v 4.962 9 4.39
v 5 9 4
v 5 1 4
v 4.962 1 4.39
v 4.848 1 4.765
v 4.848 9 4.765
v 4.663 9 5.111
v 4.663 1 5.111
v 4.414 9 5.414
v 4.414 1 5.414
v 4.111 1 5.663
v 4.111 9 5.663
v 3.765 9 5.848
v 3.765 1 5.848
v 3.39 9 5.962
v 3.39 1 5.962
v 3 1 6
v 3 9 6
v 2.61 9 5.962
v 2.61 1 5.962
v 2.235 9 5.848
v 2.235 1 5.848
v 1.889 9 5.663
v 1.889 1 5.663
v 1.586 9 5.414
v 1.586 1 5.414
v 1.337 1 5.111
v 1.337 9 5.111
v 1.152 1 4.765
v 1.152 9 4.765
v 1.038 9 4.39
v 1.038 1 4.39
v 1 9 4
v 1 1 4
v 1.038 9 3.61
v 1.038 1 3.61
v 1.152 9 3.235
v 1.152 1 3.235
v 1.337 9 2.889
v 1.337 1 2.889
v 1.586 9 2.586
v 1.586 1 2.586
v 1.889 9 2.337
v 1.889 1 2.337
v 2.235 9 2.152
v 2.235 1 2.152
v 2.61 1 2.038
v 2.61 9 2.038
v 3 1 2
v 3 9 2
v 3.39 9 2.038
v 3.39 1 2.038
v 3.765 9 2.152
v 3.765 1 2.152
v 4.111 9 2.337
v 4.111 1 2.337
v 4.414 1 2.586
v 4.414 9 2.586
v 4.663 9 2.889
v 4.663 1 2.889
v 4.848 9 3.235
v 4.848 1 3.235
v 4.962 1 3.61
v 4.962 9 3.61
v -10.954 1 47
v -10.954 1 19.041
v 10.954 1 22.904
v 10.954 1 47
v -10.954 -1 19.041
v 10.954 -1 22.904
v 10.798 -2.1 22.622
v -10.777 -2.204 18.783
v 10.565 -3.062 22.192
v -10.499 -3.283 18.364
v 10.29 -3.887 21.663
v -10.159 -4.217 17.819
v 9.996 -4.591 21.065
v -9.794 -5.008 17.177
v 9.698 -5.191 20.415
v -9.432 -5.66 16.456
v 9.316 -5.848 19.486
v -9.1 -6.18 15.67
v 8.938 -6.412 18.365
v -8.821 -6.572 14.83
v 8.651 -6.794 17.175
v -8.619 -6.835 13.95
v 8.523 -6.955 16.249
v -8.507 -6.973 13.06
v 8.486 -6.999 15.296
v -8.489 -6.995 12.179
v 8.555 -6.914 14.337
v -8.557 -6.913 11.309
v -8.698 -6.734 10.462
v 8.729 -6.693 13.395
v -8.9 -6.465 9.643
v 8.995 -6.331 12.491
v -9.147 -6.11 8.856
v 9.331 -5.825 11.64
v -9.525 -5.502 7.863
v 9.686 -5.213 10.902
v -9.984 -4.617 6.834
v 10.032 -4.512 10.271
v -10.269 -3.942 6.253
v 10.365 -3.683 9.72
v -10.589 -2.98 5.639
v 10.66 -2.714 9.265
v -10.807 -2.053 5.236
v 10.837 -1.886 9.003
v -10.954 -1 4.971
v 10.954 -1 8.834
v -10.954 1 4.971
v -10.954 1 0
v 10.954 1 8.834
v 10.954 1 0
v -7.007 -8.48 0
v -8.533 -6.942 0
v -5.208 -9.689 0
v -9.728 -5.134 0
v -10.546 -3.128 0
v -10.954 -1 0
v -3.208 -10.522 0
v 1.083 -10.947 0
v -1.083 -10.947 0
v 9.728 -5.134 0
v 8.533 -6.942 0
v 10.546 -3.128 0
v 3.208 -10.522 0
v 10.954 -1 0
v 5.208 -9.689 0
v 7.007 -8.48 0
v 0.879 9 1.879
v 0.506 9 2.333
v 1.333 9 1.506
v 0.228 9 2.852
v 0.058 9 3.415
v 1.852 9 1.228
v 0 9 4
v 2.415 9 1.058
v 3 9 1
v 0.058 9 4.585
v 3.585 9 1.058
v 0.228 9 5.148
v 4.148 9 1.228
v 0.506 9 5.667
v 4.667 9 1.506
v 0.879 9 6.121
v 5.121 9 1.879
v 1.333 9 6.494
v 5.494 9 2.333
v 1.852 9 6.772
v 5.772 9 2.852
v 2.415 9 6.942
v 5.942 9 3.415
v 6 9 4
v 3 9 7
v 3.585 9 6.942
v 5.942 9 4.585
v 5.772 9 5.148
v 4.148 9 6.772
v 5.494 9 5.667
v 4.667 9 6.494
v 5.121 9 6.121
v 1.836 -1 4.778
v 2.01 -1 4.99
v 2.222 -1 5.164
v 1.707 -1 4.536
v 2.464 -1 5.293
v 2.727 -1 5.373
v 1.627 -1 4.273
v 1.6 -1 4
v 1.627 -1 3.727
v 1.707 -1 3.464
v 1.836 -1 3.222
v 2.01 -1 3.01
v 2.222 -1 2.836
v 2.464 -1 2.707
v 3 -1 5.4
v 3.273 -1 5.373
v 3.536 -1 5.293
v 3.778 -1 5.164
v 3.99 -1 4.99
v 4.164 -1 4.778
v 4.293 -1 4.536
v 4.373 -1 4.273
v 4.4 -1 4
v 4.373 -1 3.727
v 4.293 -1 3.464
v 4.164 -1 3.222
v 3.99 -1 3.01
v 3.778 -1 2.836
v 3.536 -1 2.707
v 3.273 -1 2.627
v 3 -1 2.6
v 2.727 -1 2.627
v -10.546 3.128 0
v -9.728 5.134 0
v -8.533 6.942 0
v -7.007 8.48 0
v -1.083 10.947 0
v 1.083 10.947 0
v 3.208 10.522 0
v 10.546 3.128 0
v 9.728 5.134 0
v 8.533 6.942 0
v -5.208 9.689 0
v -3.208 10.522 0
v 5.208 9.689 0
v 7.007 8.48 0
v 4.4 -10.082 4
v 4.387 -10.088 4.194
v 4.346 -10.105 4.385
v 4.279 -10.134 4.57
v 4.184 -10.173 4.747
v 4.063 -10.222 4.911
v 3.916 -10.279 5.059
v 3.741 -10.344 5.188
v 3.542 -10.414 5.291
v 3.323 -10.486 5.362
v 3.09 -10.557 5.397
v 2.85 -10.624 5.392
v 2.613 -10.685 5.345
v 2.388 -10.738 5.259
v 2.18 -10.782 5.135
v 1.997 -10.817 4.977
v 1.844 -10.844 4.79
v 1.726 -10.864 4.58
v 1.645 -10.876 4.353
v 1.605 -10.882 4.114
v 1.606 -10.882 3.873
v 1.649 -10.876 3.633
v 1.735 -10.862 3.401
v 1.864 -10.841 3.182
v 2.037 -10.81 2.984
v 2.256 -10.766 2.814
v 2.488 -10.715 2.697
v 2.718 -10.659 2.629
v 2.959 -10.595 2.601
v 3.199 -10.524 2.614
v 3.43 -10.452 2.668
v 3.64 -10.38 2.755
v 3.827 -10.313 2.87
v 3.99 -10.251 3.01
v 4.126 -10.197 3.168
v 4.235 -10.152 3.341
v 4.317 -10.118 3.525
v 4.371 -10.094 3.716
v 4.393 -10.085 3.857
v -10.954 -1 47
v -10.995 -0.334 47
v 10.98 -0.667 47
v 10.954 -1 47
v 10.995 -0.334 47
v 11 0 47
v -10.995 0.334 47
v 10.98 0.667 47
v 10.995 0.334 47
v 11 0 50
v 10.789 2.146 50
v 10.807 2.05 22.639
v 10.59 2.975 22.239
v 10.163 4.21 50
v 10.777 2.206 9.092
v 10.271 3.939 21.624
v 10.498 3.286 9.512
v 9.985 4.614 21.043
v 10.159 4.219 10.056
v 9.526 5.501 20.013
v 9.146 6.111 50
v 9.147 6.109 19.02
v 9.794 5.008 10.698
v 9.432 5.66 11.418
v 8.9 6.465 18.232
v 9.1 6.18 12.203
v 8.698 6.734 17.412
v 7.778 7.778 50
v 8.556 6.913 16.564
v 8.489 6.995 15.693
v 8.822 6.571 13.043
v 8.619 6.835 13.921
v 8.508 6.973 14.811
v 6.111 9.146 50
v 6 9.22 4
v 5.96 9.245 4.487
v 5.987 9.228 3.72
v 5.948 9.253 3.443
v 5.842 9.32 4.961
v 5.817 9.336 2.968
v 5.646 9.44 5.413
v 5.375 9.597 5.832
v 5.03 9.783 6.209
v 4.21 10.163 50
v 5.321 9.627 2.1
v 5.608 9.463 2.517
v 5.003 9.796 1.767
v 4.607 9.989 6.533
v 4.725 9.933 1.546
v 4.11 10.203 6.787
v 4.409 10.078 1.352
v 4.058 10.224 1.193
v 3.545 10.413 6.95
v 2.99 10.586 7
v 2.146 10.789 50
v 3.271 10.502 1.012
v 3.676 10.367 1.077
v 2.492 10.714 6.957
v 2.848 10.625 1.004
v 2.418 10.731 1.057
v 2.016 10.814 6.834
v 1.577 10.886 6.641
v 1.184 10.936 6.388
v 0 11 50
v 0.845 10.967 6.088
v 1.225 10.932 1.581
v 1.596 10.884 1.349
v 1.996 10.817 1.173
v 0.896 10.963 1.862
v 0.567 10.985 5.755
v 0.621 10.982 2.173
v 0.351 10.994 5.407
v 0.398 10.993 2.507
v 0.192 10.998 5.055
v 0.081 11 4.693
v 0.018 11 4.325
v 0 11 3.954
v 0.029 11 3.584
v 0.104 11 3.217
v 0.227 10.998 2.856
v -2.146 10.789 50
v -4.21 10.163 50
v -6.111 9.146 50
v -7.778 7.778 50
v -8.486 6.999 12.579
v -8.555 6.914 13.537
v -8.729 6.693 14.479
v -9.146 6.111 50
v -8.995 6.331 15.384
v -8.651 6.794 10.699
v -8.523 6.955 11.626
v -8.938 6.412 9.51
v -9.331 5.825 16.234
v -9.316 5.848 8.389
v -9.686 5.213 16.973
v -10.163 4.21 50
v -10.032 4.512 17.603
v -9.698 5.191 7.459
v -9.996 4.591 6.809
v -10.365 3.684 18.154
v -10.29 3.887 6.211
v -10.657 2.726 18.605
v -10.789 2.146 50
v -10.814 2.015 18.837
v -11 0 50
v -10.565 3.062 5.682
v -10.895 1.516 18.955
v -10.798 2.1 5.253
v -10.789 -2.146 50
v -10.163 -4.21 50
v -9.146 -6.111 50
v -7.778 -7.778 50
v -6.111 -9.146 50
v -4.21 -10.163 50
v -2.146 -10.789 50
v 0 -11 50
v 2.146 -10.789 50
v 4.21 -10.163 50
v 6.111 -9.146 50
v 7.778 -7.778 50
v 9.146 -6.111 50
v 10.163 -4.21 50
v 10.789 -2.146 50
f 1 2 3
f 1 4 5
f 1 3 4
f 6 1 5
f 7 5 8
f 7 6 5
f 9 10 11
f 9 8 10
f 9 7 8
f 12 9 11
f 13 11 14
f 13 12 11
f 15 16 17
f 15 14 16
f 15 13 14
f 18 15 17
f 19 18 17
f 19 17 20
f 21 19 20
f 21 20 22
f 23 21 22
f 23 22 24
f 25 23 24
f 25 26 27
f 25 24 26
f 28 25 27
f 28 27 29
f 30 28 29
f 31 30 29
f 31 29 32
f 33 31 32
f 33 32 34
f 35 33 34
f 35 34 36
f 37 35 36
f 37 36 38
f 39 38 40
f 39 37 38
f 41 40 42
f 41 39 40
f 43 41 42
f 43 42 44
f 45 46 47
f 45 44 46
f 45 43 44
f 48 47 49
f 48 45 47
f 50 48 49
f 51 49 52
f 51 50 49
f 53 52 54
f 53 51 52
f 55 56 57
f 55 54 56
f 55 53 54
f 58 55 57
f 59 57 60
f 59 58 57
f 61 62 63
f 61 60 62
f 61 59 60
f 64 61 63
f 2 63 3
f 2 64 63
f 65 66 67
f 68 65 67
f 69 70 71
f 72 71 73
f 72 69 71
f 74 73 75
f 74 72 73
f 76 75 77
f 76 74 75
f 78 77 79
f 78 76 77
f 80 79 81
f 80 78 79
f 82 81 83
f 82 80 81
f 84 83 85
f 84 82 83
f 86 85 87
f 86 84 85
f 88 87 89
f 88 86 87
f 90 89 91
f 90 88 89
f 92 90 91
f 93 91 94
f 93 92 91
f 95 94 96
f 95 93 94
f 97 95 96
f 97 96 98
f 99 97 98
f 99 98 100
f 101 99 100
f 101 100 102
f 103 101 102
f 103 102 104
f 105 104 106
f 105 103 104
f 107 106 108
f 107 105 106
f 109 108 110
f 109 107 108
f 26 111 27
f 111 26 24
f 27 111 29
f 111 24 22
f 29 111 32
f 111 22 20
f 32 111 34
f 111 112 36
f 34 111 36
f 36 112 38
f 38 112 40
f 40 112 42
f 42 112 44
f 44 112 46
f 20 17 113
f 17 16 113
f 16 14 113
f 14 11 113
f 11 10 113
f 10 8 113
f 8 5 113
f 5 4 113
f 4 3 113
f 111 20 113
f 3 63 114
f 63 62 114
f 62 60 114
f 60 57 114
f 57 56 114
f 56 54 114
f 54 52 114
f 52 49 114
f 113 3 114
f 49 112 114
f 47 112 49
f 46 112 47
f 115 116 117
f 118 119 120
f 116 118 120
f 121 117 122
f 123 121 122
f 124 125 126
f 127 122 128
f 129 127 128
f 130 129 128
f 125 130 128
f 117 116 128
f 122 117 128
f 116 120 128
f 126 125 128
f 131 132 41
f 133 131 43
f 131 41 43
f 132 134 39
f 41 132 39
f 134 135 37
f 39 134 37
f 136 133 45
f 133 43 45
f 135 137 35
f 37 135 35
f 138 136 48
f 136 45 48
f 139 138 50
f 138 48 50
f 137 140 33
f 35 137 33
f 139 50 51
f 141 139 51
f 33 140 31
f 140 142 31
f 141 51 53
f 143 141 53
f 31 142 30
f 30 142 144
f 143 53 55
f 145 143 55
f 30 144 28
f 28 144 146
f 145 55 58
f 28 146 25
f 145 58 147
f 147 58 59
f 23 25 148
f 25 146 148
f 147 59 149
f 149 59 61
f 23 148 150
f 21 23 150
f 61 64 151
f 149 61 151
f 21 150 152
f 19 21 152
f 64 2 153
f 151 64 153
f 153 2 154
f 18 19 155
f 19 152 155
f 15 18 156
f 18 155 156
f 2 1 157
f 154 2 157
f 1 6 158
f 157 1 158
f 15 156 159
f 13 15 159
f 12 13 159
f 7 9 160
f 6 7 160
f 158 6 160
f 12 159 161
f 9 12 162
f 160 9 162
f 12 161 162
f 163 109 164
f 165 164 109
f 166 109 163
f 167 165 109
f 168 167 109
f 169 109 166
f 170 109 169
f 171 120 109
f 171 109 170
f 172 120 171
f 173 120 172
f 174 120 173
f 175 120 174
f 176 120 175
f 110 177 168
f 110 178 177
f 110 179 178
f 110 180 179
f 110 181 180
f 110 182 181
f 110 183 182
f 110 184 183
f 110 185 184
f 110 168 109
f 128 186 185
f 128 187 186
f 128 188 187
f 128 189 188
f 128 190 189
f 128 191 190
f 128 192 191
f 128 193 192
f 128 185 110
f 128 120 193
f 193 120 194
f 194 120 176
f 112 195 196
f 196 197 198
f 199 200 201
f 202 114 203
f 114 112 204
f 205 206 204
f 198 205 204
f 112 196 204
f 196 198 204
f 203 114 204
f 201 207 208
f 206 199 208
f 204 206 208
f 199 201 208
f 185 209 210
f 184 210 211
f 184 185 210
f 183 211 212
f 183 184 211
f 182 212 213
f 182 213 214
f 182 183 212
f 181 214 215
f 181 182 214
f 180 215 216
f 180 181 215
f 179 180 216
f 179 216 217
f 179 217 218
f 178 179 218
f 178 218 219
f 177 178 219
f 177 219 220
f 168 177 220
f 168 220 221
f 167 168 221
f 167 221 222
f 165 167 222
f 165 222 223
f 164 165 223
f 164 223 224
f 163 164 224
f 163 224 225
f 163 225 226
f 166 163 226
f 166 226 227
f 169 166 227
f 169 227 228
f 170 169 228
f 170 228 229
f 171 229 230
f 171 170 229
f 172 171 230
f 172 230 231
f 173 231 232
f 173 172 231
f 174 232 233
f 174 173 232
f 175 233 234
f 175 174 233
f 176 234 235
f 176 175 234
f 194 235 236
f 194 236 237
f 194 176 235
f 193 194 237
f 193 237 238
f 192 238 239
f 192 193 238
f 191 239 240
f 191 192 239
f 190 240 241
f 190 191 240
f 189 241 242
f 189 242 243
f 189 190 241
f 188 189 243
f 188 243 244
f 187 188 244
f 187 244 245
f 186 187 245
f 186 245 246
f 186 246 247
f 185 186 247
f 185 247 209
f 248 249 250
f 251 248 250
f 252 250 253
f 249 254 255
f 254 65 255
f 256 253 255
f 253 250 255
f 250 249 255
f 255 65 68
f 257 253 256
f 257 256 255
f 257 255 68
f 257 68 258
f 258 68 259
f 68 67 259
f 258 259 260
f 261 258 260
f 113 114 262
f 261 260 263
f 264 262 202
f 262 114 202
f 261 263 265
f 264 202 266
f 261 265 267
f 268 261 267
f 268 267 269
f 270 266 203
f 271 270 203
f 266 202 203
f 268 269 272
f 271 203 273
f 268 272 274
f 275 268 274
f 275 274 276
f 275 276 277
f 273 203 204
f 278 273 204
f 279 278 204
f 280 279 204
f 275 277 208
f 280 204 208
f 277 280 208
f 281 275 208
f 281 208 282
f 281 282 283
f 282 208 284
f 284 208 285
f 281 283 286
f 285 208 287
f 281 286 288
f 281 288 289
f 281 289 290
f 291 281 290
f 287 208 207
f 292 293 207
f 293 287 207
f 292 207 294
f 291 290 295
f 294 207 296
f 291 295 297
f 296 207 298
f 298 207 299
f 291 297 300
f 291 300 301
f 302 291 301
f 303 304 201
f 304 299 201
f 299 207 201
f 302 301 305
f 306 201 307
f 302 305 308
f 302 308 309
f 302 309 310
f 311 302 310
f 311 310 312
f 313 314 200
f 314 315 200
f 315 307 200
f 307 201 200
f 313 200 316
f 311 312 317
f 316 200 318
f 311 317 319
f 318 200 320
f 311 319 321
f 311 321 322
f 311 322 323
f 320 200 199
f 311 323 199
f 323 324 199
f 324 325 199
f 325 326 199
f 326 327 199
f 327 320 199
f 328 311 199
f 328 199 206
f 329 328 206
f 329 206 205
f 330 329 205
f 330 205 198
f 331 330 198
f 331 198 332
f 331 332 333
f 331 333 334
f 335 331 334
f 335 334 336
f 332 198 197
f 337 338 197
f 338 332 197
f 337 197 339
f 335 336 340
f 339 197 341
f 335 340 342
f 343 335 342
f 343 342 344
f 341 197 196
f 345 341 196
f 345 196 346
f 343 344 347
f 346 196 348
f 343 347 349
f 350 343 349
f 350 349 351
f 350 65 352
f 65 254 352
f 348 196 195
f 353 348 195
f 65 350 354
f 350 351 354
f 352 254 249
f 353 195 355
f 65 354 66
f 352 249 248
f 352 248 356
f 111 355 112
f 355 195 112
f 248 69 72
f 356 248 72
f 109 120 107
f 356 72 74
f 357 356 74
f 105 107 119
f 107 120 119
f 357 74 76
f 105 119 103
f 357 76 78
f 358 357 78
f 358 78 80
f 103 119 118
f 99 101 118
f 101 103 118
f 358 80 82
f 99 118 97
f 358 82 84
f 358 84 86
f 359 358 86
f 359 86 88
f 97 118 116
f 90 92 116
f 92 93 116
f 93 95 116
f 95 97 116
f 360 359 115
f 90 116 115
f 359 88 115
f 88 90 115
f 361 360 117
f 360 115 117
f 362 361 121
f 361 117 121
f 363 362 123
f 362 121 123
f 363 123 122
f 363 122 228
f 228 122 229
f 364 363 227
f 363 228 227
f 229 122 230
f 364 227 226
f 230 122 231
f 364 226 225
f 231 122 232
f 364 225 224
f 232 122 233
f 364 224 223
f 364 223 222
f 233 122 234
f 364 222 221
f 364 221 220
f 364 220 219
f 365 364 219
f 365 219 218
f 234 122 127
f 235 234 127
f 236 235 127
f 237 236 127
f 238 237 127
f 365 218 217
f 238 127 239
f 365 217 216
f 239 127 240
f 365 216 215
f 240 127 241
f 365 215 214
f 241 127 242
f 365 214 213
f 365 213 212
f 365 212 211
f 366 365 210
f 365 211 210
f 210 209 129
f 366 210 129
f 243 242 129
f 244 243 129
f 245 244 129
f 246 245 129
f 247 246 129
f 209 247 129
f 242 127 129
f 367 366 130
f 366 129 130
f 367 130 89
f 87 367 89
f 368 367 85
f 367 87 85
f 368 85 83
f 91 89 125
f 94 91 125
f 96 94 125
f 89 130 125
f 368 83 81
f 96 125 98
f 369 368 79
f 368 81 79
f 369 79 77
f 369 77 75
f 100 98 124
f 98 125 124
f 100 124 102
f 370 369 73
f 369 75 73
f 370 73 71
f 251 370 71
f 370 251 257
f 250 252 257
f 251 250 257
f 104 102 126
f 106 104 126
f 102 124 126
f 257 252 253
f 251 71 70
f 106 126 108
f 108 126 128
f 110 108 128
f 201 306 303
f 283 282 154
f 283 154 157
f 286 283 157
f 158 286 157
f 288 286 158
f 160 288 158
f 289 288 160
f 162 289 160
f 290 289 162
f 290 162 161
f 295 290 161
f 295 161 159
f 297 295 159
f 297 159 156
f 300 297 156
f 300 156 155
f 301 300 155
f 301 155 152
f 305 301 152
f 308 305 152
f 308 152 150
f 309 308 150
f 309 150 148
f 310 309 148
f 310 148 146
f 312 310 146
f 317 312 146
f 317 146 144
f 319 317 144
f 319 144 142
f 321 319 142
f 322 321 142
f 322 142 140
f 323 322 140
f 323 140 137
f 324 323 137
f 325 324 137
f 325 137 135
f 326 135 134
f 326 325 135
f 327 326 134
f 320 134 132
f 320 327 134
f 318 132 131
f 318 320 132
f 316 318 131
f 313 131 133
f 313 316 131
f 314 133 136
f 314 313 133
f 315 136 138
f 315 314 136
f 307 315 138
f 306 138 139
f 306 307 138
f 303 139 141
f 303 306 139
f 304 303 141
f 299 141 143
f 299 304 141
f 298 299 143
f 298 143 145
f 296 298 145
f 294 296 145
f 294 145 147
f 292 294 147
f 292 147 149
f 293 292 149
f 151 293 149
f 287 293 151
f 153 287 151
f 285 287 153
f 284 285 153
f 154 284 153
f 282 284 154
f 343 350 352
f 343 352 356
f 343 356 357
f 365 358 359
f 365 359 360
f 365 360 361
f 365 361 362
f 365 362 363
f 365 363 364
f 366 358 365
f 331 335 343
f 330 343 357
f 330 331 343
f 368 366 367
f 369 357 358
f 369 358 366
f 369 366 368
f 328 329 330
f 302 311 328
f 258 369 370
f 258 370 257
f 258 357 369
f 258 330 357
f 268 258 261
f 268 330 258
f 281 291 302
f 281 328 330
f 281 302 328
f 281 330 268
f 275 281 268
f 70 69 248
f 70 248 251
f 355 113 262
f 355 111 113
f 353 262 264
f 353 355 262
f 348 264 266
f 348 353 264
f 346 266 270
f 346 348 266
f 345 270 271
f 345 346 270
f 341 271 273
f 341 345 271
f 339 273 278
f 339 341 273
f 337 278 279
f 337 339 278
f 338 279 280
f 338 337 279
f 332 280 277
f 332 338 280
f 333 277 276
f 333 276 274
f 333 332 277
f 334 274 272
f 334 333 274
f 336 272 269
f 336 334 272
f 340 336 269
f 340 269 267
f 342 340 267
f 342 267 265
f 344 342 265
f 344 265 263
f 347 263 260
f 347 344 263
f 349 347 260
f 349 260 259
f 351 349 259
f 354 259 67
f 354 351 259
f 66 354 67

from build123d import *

# Parameters (mm, degrees)
CYLINDER004_R               = 3
CYLINDER004_DEPTH           = 28
CYLINDER003_R               = 2
CYLINDER003_DEPTH           = 28
CYLINDER002_R               = 1.4
CYLINDER002_DEPTH           = 28
BOX_W                       = 100
BOX_H                       = 2
BOX_DEPTH                   = 100
CYLINDER001_R               = 7
CYLINDER001_DEPTH           = 100
CYLINDER001_PLACEMENT_ANGLE = 80
CYLINDER_R                  = 11
CYLINDER_DEPTH              = 50


with BuildPart() as cylinder004:
    # Cylinder004 → Cylinder004 (new body)
    with BuildSketch(Plane(origin=(3, 37, 4), x_dir=(1, 0, 0), z_dir=(0, -1, 0))):
        Circle(CYLINDER004_R)
    extrude(amount=CYLINDER004_DEPTH)


with BuildPart() as cylinder003:
    # Cylinder003 → Cylinder003 (new body)
    with BuildSketch(Plane(origin=(3, 28, 4), x_dir=(1, 0, 0), z_dir=(0, -1, 0))):
        Circle(CYLINDER003_R)
    extrude(amount=CYLINDER003_DEPTH)


with BuildPart() as cylinder002:
    # Cylinder002 → Cylinder002 (new body)
    with BuildSketch(Plane(origin=(3, 13, 4), x_dir=(1, 0, 0), z_dir=(0, -1, 0))):
        Circle(CYLINDER002_R)
    extrude(amount=CYLINDER002_DEPTH)


with BuildPart() as cube:
    # Box → Box (new body)
    with BuildSketch(Plane(origin=(-17, -1, -53), x_dir=(1, 0, 0), z_dir=(0, 0, 1))):
        with Locations((50, 1)):
            Rectangle(BOX_W, BOX_H)
    extrude(amount=BOX_DEPTH)


with BuildPart() as cylinder001:
    # Cylinder001 → Cylinder001 (new body)
    with BuildSketch(Plane.XY):
        Circle(CYLINDER001_R)
    extrude(amount=CYLINDER001_DEPTH)


with BuildPart() as cylinder001_1:
    # Cylinder001 placement: moved
    add(cylinder001.part.moved(Location((-28, 0, 9))).rotate(Axis((-28, 0, 9), (0, 1, 0)), CYLINDER001_PLACEMENT_ANGLE))


with BuildPart() as cut004:
    # Cylinder → Cylinder (new body)
    with BuildSketch(Plane.XY):
        Circle(CYLINDER_R)
    extrude(amount=CYLINDER_DEPTH)

    # Cut: cut Cylinder001
    add(cylinder001_1.part, mode=Mode.SUBTRACT)

    # Cut001: cut Cube
    add(cube.part, mode=Mode.SUBTRACT)

    # Cut002: cut Cylinder002
    add(cylinder002.part, mode=Mode.SUBTRACT)

    # Cut003: cut Cylinder003
    add(cylinder003.part, mode=Mode.SUBTRACT)

    # Cut004: cut Cylinder004
    add(cylinder004.part, mode=Mode.SUBTRACT)


solid = cut004.part
